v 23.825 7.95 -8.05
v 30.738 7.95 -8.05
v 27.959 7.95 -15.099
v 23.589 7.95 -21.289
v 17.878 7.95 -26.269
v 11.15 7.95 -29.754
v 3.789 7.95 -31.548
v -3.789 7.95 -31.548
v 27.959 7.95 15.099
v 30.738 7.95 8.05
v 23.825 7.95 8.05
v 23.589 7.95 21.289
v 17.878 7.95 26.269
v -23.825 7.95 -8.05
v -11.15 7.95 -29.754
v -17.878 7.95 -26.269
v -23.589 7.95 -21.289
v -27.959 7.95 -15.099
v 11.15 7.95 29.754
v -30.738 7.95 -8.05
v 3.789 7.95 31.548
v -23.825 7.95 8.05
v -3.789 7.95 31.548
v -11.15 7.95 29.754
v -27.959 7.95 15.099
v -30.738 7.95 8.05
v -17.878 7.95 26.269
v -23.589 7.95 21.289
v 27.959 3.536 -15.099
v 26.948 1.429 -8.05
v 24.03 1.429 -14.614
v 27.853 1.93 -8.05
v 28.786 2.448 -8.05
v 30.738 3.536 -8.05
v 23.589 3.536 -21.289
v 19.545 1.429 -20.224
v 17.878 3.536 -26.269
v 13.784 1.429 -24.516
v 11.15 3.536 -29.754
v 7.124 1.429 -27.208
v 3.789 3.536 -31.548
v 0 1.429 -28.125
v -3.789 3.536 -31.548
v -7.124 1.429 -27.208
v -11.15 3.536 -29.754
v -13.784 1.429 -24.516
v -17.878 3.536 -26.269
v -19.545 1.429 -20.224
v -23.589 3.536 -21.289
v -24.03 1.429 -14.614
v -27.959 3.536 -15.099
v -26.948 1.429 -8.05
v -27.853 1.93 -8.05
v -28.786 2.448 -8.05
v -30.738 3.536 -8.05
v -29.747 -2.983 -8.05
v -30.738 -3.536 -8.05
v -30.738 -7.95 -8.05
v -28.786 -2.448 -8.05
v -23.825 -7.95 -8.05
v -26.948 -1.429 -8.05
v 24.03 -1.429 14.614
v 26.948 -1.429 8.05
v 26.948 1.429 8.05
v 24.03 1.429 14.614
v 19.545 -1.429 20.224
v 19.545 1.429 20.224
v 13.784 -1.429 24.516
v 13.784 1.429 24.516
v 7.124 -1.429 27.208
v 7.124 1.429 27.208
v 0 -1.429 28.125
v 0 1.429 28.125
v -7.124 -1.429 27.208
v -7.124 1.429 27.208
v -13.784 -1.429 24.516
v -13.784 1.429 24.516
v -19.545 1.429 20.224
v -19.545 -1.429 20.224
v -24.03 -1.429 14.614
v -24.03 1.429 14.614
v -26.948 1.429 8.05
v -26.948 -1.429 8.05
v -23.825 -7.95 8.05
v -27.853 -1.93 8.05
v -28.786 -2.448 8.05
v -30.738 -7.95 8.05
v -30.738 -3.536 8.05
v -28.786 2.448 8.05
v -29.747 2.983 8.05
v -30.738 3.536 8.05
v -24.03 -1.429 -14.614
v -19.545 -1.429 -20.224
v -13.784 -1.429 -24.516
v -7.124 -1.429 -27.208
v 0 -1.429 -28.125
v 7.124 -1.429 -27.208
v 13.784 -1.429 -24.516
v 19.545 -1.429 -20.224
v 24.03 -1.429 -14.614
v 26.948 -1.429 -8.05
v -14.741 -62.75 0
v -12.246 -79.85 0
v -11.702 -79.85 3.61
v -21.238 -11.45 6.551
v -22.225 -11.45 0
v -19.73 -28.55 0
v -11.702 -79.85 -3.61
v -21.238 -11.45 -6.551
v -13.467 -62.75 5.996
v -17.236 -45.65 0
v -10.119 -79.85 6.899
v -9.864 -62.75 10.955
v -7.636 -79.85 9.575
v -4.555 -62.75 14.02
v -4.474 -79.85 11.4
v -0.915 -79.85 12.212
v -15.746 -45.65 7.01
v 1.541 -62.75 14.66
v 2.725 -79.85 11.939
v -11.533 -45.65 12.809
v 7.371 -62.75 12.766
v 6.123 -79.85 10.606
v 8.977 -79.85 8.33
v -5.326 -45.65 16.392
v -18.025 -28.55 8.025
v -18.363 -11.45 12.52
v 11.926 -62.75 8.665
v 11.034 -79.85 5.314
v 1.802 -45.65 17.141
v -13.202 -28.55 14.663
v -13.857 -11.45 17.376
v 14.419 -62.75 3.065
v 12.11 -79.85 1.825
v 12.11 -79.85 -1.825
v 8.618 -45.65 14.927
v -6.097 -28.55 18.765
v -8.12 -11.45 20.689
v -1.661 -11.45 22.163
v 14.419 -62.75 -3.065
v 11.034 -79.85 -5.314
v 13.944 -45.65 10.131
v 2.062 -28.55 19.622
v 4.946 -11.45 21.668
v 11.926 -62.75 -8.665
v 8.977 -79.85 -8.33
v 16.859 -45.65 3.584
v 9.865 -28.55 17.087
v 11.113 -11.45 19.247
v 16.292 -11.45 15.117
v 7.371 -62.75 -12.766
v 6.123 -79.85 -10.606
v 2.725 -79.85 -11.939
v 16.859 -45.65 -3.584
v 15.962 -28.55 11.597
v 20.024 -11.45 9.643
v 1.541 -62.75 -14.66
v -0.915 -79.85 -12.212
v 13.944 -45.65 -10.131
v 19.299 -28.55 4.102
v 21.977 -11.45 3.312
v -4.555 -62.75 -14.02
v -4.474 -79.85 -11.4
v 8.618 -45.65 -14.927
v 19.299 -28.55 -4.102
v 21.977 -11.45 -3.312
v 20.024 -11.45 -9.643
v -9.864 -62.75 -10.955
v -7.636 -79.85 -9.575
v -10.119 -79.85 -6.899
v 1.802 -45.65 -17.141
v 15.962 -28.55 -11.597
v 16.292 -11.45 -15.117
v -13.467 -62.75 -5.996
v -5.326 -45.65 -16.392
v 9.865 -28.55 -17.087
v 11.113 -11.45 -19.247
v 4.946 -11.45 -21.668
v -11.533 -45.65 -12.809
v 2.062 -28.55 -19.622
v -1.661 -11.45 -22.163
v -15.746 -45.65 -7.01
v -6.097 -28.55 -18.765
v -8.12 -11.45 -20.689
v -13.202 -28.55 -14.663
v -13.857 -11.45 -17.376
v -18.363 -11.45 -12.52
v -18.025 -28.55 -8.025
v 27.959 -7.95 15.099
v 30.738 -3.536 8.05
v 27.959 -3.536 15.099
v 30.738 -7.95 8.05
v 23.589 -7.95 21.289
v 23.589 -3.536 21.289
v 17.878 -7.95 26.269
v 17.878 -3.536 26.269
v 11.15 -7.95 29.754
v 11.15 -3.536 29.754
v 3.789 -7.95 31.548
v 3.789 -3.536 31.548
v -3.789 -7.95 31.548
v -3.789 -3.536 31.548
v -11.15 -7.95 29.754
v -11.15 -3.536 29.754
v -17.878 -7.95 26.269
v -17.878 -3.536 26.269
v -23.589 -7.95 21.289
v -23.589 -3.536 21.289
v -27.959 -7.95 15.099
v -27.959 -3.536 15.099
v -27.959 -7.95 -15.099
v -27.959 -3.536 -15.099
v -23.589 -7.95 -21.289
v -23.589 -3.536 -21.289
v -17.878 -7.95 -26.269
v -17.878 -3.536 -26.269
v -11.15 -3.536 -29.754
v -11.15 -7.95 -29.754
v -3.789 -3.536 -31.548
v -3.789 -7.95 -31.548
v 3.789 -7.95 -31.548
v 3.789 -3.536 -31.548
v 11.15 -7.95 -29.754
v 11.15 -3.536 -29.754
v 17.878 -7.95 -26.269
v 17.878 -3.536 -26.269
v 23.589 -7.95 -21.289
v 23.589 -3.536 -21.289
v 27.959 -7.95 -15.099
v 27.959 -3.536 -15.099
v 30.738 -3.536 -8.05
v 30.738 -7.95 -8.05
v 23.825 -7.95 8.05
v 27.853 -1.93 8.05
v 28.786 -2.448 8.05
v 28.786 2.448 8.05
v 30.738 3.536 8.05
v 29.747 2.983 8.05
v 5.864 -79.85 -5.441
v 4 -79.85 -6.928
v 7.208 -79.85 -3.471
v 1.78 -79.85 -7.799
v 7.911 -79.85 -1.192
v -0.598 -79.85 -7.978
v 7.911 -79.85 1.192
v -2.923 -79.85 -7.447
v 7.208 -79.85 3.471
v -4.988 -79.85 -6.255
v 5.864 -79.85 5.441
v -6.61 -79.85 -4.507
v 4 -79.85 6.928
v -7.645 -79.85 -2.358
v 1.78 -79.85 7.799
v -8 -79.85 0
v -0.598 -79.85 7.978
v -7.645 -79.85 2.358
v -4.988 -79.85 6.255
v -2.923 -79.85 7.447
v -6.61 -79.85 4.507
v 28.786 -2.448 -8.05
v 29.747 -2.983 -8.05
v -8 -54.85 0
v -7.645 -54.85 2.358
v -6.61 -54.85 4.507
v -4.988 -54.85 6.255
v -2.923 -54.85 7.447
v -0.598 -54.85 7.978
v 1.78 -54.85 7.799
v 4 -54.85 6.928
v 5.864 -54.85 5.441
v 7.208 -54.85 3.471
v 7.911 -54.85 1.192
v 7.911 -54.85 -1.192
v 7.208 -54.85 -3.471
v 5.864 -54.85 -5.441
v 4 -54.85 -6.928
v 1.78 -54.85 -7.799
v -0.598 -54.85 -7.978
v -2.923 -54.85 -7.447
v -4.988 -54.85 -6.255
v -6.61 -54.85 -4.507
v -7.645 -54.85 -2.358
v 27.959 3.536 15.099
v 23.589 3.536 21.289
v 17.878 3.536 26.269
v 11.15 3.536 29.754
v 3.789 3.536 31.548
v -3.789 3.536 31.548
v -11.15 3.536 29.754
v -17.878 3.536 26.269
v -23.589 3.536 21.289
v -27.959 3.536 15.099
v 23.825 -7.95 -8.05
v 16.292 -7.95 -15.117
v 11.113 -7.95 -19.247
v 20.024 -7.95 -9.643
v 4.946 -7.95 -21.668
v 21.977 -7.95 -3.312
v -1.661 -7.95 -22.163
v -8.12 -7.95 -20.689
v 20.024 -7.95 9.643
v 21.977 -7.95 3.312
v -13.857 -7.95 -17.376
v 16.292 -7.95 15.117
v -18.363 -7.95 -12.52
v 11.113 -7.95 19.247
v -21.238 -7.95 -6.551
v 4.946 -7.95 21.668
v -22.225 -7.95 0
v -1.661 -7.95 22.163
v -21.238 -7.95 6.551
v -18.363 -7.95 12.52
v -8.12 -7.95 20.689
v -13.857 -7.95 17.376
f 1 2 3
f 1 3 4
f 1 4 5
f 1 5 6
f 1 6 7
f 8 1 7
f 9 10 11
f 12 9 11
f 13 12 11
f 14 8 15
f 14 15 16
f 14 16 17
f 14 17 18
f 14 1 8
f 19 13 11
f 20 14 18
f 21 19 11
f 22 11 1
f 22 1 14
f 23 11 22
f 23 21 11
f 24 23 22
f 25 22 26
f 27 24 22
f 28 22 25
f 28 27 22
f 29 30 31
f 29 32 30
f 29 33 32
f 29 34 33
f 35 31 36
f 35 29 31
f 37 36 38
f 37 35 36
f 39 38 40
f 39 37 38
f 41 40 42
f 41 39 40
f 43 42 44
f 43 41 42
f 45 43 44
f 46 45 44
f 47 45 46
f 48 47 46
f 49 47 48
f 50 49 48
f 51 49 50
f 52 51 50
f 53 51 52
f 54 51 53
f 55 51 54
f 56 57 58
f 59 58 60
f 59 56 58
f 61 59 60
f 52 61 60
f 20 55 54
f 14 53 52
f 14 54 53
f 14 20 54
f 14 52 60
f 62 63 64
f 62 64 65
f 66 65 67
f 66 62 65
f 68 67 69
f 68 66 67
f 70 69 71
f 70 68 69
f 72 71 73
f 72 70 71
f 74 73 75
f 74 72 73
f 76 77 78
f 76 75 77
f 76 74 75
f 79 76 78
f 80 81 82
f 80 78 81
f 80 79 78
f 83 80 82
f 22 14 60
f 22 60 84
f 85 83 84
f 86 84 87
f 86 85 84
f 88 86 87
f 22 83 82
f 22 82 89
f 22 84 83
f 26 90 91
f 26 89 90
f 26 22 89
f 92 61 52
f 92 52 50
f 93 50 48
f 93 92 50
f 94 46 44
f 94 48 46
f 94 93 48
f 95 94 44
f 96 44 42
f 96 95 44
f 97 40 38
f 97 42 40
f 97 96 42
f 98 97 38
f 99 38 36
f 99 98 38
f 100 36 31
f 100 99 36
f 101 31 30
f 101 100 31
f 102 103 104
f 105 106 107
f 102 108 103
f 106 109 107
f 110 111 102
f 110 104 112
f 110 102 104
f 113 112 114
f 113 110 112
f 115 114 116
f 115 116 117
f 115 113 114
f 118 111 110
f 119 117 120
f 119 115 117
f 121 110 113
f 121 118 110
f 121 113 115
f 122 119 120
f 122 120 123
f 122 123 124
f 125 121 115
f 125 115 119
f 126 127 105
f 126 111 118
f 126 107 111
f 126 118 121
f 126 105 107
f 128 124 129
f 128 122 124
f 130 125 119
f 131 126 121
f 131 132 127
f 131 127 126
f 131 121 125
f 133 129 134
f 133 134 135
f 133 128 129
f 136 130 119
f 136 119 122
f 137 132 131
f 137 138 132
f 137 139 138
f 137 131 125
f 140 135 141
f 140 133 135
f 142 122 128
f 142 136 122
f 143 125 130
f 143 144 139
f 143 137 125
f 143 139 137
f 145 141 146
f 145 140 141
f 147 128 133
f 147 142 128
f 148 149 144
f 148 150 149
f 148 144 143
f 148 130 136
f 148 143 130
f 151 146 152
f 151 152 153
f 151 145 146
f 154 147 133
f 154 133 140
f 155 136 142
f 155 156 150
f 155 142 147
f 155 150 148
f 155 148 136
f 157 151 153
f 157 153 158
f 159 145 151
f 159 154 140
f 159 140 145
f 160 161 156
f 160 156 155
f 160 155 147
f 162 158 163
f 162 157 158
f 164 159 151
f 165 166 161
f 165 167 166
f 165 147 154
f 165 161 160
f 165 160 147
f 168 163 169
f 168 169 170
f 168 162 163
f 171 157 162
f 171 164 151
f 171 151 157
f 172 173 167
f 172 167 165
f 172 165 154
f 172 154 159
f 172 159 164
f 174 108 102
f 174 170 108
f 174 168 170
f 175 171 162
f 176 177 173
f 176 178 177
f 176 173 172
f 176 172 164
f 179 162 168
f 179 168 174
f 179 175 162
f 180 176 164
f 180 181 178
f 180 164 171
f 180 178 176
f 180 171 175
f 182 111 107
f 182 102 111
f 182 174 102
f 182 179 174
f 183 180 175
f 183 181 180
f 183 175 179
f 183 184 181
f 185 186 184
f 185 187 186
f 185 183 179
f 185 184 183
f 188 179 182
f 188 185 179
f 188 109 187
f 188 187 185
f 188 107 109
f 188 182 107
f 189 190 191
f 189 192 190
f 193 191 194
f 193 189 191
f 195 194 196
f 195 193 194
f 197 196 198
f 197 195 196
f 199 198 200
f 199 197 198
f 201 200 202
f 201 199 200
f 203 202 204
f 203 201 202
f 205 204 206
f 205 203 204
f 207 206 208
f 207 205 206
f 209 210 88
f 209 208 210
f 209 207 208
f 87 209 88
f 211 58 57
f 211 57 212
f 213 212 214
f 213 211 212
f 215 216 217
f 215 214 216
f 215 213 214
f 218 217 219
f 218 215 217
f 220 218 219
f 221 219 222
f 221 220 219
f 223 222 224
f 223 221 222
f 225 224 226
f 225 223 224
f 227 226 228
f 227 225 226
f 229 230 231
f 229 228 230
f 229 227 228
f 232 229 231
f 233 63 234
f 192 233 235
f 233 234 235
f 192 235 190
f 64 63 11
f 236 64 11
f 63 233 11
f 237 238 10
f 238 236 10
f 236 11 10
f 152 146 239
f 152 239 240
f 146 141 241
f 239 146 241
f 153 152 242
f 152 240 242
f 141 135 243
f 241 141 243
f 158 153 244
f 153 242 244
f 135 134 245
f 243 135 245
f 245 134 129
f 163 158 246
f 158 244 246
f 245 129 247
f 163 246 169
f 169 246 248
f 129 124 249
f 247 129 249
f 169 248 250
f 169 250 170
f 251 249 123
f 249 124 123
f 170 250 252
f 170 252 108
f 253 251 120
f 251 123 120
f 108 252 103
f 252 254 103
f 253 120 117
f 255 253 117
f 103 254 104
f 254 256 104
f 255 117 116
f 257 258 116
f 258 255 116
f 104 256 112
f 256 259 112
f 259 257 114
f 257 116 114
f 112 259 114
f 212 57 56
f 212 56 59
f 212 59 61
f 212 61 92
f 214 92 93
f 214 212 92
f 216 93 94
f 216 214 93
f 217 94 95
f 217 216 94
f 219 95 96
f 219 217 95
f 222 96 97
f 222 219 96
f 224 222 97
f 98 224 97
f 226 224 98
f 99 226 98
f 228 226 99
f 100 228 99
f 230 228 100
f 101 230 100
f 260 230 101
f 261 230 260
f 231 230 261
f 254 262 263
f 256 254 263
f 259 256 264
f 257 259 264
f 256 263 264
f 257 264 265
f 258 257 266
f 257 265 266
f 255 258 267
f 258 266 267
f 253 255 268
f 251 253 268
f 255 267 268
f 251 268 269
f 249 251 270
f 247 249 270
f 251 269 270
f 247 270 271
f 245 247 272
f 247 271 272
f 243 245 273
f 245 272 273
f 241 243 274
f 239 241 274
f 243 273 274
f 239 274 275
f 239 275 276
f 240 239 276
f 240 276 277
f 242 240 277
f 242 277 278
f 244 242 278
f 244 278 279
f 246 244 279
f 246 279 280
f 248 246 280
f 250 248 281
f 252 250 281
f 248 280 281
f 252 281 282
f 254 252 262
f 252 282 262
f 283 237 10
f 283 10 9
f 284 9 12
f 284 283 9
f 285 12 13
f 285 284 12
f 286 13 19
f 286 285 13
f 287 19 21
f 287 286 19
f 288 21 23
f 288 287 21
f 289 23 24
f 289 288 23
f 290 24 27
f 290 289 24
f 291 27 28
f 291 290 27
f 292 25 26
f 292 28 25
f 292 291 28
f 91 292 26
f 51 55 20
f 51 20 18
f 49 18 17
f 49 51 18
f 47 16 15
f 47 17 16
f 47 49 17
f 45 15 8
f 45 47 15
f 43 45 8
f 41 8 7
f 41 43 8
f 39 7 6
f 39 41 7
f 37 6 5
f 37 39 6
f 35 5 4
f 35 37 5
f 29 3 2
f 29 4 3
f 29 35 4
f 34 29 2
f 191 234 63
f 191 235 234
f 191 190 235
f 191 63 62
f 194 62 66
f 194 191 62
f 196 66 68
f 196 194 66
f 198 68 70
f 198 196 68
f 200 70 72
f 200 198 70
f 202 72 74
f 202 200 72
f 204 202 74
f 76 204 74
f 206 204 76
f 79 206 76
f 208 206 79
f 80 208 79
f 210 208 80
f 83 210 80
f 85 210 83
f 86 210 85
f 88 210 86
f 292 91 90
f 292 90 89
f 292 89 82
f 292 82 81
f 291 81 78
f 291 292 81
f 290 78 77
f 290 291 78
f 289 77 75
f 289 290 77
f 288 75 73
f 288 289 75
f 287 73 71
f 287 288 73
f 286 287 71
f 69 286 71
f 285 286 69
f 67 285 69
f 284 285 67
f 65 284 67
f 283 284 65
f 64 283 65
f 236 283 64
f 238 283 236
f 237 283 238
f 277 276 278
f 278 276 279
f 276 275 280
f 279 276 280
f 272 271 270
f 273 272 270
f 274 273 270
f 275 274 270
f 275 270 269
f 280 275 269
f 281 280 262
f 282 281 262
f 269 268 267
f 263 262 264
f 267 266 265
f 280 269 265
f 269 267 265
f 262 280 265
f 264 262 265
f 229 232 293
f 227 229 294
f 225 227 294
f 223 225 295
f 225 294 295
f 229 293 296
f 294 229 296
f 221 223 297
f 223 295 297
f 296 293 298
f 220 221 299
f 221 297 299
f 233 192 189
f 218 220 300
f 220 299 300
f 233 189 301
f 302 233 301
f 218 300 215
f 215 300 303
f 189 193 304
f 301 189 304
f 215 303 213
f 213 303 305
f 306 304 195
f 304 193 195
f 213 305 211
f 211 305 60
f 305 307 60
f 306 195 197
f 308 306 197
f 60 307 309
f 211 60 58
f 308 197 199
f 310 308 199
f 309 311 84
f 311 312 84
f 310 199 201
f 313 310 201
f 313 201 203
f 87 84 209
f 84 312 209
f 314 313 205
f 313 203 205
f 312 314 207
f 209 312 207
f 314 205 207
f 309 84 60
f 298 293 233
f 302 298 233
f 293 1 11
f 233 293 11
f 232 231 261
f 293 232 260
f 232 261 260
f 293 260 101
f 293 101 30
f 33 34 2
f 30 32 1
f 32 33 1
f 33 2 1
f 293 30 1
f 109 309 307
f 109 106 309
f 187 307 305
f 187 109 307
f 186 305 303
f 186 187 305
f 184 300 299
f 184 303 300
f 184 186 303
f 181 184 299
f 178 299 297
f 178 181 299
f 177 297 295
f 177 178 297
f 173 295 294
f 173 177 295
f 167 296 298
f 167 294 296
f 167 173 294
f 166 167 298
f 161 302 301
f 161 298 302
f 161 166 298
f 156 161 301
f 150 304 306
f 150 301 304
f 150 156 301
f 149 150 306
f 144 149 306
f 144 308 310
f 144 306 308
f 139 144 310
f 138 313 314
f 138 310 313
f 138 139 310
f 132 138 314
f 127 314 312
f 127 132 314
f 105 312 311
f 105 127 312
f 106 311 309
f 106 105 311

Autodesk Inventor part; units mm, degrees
ref_plane "YZ Plane" through (0, 0, 0) normal (1, 0, 0) x (0, 1, 0)
ref_plane "XZ Plane" through (0, 0, 0) normal (0, 1, 0) x (-1, 0, 0)
ref_plane "XY Plane" through (0, 0, 0) normal (0, 0, 1) x (1, 0, 0)
sketch "Sketch1" plane through (0, 0, 0) normal (0, 0, 1) x (1, 0, 0)
  line L0 (-43.38, 0) -> (7.23, 0) construction
  line L1 (0, -97.41) -> (0, 25.51) projected
  line L2 (0, 7.95) -> (-31.775, 7.95)
  line L3 (-31.775, 7.95) -> (-31.775, 3.5363)
  line L4 (-31.775, 3.5363) -> (-28.125, 1.4289)
  line L5 (-28.125, 1.4289) -> (-28.125, -1.4289)
  line L6 (-31.775, -7.95) -> (0, -7.95)
  line L7 (-28.125, -1.4289) -> (-31.775, -3.5363)
  line L8 (-31.775, -3.5363) -> (-31.775, -7.95)
  circle A0 centre (-32.65, 0) radius 3.5 construction
  line L9 (-22.225, -7.95) -> (-22.225, -11.45)
  line L10 (-22.225, -11.45) -> (0, -11.45) construction
  line L11 (-22.225, -11.45) -> (-12.2465, -79.85)
  line L12 (-12.2465, -79.85) -> (-8, -79.85)
  line L13 (-8, -79.85) -> (-8, -54.85)
  line L14 (-8, -54.85) -> (0, -54.85)
  point P0 (0, 0)
  point P1 (-36.15, 0)
  dimension "d5" = 7
  dimension "d0" = 60
  dimension "d1" = 56.25
  dimension "d2" = 63.55
  dimension "d3" = 15.9
  dimension "d6" = 72.3
  dimension "d14" = 3.5
  dimension "d15" = 44.45
  dimension "d16" = 68.4
  dimension "d17" = 8.3
  dimension "d18" = 25
  dimension "d19" = 16
  dimension "d20" = 24.493
revolve "Revolution1" add sketch "Sketch1" angle 360 about axis through (0, -10, 0) along (0, 1, 0)
sketch "Sketch2" plane through (0, 7.95, 0) normal (0, 1, 0) x (1, 0, 0)
  circle A0 centre (0, 0) radius 31.775 construction
  line L0 (-44.485, 0) -> (44.485, 0) construction
  line L1 (0, 44.485) -> (0, -44.485) construction
  line L2 (-31.775, 8.05) -> (-23.825, 8.05)
  line L3 (-23.825, 8.05) -> (-23.825, -8.05)
  line L4 (-23.825, -8.05) -> (-31.775, -8.05)
  line L5 (-31.775, -8.05) -> (-31.775, 8.05)
  circle A1 centre (0, 0) radius 31.775 projected
  line L6 (31.775, 8.05) -> (23.825, 8.05)
  line L7 (23.825, 8.05) -> (23.825, -8.05)
  line L8 (23.825, -8.05) -> (31.775, -8.05)
  line L9 (31.775, -8.05) -> (31.775, 8.05)
  point P0 (-31.775, 0)
  point P1 (31.775, 0)
  point P2 (30.7384, -8.05)
  point P3 (30.7384, 8.05)
  point P4 (-30.7384, 8.05)
  point P5 (-30.7384, -8.05)
  dimension "d12" = 16.1
  dimension "d13" = 47.65
extrude "Extrusion1" cut sketch "Sketch2" against normal through all contours L2 L3 L4 A1 | A1 L8 L7 L6
properties part number "SK40Collar"
